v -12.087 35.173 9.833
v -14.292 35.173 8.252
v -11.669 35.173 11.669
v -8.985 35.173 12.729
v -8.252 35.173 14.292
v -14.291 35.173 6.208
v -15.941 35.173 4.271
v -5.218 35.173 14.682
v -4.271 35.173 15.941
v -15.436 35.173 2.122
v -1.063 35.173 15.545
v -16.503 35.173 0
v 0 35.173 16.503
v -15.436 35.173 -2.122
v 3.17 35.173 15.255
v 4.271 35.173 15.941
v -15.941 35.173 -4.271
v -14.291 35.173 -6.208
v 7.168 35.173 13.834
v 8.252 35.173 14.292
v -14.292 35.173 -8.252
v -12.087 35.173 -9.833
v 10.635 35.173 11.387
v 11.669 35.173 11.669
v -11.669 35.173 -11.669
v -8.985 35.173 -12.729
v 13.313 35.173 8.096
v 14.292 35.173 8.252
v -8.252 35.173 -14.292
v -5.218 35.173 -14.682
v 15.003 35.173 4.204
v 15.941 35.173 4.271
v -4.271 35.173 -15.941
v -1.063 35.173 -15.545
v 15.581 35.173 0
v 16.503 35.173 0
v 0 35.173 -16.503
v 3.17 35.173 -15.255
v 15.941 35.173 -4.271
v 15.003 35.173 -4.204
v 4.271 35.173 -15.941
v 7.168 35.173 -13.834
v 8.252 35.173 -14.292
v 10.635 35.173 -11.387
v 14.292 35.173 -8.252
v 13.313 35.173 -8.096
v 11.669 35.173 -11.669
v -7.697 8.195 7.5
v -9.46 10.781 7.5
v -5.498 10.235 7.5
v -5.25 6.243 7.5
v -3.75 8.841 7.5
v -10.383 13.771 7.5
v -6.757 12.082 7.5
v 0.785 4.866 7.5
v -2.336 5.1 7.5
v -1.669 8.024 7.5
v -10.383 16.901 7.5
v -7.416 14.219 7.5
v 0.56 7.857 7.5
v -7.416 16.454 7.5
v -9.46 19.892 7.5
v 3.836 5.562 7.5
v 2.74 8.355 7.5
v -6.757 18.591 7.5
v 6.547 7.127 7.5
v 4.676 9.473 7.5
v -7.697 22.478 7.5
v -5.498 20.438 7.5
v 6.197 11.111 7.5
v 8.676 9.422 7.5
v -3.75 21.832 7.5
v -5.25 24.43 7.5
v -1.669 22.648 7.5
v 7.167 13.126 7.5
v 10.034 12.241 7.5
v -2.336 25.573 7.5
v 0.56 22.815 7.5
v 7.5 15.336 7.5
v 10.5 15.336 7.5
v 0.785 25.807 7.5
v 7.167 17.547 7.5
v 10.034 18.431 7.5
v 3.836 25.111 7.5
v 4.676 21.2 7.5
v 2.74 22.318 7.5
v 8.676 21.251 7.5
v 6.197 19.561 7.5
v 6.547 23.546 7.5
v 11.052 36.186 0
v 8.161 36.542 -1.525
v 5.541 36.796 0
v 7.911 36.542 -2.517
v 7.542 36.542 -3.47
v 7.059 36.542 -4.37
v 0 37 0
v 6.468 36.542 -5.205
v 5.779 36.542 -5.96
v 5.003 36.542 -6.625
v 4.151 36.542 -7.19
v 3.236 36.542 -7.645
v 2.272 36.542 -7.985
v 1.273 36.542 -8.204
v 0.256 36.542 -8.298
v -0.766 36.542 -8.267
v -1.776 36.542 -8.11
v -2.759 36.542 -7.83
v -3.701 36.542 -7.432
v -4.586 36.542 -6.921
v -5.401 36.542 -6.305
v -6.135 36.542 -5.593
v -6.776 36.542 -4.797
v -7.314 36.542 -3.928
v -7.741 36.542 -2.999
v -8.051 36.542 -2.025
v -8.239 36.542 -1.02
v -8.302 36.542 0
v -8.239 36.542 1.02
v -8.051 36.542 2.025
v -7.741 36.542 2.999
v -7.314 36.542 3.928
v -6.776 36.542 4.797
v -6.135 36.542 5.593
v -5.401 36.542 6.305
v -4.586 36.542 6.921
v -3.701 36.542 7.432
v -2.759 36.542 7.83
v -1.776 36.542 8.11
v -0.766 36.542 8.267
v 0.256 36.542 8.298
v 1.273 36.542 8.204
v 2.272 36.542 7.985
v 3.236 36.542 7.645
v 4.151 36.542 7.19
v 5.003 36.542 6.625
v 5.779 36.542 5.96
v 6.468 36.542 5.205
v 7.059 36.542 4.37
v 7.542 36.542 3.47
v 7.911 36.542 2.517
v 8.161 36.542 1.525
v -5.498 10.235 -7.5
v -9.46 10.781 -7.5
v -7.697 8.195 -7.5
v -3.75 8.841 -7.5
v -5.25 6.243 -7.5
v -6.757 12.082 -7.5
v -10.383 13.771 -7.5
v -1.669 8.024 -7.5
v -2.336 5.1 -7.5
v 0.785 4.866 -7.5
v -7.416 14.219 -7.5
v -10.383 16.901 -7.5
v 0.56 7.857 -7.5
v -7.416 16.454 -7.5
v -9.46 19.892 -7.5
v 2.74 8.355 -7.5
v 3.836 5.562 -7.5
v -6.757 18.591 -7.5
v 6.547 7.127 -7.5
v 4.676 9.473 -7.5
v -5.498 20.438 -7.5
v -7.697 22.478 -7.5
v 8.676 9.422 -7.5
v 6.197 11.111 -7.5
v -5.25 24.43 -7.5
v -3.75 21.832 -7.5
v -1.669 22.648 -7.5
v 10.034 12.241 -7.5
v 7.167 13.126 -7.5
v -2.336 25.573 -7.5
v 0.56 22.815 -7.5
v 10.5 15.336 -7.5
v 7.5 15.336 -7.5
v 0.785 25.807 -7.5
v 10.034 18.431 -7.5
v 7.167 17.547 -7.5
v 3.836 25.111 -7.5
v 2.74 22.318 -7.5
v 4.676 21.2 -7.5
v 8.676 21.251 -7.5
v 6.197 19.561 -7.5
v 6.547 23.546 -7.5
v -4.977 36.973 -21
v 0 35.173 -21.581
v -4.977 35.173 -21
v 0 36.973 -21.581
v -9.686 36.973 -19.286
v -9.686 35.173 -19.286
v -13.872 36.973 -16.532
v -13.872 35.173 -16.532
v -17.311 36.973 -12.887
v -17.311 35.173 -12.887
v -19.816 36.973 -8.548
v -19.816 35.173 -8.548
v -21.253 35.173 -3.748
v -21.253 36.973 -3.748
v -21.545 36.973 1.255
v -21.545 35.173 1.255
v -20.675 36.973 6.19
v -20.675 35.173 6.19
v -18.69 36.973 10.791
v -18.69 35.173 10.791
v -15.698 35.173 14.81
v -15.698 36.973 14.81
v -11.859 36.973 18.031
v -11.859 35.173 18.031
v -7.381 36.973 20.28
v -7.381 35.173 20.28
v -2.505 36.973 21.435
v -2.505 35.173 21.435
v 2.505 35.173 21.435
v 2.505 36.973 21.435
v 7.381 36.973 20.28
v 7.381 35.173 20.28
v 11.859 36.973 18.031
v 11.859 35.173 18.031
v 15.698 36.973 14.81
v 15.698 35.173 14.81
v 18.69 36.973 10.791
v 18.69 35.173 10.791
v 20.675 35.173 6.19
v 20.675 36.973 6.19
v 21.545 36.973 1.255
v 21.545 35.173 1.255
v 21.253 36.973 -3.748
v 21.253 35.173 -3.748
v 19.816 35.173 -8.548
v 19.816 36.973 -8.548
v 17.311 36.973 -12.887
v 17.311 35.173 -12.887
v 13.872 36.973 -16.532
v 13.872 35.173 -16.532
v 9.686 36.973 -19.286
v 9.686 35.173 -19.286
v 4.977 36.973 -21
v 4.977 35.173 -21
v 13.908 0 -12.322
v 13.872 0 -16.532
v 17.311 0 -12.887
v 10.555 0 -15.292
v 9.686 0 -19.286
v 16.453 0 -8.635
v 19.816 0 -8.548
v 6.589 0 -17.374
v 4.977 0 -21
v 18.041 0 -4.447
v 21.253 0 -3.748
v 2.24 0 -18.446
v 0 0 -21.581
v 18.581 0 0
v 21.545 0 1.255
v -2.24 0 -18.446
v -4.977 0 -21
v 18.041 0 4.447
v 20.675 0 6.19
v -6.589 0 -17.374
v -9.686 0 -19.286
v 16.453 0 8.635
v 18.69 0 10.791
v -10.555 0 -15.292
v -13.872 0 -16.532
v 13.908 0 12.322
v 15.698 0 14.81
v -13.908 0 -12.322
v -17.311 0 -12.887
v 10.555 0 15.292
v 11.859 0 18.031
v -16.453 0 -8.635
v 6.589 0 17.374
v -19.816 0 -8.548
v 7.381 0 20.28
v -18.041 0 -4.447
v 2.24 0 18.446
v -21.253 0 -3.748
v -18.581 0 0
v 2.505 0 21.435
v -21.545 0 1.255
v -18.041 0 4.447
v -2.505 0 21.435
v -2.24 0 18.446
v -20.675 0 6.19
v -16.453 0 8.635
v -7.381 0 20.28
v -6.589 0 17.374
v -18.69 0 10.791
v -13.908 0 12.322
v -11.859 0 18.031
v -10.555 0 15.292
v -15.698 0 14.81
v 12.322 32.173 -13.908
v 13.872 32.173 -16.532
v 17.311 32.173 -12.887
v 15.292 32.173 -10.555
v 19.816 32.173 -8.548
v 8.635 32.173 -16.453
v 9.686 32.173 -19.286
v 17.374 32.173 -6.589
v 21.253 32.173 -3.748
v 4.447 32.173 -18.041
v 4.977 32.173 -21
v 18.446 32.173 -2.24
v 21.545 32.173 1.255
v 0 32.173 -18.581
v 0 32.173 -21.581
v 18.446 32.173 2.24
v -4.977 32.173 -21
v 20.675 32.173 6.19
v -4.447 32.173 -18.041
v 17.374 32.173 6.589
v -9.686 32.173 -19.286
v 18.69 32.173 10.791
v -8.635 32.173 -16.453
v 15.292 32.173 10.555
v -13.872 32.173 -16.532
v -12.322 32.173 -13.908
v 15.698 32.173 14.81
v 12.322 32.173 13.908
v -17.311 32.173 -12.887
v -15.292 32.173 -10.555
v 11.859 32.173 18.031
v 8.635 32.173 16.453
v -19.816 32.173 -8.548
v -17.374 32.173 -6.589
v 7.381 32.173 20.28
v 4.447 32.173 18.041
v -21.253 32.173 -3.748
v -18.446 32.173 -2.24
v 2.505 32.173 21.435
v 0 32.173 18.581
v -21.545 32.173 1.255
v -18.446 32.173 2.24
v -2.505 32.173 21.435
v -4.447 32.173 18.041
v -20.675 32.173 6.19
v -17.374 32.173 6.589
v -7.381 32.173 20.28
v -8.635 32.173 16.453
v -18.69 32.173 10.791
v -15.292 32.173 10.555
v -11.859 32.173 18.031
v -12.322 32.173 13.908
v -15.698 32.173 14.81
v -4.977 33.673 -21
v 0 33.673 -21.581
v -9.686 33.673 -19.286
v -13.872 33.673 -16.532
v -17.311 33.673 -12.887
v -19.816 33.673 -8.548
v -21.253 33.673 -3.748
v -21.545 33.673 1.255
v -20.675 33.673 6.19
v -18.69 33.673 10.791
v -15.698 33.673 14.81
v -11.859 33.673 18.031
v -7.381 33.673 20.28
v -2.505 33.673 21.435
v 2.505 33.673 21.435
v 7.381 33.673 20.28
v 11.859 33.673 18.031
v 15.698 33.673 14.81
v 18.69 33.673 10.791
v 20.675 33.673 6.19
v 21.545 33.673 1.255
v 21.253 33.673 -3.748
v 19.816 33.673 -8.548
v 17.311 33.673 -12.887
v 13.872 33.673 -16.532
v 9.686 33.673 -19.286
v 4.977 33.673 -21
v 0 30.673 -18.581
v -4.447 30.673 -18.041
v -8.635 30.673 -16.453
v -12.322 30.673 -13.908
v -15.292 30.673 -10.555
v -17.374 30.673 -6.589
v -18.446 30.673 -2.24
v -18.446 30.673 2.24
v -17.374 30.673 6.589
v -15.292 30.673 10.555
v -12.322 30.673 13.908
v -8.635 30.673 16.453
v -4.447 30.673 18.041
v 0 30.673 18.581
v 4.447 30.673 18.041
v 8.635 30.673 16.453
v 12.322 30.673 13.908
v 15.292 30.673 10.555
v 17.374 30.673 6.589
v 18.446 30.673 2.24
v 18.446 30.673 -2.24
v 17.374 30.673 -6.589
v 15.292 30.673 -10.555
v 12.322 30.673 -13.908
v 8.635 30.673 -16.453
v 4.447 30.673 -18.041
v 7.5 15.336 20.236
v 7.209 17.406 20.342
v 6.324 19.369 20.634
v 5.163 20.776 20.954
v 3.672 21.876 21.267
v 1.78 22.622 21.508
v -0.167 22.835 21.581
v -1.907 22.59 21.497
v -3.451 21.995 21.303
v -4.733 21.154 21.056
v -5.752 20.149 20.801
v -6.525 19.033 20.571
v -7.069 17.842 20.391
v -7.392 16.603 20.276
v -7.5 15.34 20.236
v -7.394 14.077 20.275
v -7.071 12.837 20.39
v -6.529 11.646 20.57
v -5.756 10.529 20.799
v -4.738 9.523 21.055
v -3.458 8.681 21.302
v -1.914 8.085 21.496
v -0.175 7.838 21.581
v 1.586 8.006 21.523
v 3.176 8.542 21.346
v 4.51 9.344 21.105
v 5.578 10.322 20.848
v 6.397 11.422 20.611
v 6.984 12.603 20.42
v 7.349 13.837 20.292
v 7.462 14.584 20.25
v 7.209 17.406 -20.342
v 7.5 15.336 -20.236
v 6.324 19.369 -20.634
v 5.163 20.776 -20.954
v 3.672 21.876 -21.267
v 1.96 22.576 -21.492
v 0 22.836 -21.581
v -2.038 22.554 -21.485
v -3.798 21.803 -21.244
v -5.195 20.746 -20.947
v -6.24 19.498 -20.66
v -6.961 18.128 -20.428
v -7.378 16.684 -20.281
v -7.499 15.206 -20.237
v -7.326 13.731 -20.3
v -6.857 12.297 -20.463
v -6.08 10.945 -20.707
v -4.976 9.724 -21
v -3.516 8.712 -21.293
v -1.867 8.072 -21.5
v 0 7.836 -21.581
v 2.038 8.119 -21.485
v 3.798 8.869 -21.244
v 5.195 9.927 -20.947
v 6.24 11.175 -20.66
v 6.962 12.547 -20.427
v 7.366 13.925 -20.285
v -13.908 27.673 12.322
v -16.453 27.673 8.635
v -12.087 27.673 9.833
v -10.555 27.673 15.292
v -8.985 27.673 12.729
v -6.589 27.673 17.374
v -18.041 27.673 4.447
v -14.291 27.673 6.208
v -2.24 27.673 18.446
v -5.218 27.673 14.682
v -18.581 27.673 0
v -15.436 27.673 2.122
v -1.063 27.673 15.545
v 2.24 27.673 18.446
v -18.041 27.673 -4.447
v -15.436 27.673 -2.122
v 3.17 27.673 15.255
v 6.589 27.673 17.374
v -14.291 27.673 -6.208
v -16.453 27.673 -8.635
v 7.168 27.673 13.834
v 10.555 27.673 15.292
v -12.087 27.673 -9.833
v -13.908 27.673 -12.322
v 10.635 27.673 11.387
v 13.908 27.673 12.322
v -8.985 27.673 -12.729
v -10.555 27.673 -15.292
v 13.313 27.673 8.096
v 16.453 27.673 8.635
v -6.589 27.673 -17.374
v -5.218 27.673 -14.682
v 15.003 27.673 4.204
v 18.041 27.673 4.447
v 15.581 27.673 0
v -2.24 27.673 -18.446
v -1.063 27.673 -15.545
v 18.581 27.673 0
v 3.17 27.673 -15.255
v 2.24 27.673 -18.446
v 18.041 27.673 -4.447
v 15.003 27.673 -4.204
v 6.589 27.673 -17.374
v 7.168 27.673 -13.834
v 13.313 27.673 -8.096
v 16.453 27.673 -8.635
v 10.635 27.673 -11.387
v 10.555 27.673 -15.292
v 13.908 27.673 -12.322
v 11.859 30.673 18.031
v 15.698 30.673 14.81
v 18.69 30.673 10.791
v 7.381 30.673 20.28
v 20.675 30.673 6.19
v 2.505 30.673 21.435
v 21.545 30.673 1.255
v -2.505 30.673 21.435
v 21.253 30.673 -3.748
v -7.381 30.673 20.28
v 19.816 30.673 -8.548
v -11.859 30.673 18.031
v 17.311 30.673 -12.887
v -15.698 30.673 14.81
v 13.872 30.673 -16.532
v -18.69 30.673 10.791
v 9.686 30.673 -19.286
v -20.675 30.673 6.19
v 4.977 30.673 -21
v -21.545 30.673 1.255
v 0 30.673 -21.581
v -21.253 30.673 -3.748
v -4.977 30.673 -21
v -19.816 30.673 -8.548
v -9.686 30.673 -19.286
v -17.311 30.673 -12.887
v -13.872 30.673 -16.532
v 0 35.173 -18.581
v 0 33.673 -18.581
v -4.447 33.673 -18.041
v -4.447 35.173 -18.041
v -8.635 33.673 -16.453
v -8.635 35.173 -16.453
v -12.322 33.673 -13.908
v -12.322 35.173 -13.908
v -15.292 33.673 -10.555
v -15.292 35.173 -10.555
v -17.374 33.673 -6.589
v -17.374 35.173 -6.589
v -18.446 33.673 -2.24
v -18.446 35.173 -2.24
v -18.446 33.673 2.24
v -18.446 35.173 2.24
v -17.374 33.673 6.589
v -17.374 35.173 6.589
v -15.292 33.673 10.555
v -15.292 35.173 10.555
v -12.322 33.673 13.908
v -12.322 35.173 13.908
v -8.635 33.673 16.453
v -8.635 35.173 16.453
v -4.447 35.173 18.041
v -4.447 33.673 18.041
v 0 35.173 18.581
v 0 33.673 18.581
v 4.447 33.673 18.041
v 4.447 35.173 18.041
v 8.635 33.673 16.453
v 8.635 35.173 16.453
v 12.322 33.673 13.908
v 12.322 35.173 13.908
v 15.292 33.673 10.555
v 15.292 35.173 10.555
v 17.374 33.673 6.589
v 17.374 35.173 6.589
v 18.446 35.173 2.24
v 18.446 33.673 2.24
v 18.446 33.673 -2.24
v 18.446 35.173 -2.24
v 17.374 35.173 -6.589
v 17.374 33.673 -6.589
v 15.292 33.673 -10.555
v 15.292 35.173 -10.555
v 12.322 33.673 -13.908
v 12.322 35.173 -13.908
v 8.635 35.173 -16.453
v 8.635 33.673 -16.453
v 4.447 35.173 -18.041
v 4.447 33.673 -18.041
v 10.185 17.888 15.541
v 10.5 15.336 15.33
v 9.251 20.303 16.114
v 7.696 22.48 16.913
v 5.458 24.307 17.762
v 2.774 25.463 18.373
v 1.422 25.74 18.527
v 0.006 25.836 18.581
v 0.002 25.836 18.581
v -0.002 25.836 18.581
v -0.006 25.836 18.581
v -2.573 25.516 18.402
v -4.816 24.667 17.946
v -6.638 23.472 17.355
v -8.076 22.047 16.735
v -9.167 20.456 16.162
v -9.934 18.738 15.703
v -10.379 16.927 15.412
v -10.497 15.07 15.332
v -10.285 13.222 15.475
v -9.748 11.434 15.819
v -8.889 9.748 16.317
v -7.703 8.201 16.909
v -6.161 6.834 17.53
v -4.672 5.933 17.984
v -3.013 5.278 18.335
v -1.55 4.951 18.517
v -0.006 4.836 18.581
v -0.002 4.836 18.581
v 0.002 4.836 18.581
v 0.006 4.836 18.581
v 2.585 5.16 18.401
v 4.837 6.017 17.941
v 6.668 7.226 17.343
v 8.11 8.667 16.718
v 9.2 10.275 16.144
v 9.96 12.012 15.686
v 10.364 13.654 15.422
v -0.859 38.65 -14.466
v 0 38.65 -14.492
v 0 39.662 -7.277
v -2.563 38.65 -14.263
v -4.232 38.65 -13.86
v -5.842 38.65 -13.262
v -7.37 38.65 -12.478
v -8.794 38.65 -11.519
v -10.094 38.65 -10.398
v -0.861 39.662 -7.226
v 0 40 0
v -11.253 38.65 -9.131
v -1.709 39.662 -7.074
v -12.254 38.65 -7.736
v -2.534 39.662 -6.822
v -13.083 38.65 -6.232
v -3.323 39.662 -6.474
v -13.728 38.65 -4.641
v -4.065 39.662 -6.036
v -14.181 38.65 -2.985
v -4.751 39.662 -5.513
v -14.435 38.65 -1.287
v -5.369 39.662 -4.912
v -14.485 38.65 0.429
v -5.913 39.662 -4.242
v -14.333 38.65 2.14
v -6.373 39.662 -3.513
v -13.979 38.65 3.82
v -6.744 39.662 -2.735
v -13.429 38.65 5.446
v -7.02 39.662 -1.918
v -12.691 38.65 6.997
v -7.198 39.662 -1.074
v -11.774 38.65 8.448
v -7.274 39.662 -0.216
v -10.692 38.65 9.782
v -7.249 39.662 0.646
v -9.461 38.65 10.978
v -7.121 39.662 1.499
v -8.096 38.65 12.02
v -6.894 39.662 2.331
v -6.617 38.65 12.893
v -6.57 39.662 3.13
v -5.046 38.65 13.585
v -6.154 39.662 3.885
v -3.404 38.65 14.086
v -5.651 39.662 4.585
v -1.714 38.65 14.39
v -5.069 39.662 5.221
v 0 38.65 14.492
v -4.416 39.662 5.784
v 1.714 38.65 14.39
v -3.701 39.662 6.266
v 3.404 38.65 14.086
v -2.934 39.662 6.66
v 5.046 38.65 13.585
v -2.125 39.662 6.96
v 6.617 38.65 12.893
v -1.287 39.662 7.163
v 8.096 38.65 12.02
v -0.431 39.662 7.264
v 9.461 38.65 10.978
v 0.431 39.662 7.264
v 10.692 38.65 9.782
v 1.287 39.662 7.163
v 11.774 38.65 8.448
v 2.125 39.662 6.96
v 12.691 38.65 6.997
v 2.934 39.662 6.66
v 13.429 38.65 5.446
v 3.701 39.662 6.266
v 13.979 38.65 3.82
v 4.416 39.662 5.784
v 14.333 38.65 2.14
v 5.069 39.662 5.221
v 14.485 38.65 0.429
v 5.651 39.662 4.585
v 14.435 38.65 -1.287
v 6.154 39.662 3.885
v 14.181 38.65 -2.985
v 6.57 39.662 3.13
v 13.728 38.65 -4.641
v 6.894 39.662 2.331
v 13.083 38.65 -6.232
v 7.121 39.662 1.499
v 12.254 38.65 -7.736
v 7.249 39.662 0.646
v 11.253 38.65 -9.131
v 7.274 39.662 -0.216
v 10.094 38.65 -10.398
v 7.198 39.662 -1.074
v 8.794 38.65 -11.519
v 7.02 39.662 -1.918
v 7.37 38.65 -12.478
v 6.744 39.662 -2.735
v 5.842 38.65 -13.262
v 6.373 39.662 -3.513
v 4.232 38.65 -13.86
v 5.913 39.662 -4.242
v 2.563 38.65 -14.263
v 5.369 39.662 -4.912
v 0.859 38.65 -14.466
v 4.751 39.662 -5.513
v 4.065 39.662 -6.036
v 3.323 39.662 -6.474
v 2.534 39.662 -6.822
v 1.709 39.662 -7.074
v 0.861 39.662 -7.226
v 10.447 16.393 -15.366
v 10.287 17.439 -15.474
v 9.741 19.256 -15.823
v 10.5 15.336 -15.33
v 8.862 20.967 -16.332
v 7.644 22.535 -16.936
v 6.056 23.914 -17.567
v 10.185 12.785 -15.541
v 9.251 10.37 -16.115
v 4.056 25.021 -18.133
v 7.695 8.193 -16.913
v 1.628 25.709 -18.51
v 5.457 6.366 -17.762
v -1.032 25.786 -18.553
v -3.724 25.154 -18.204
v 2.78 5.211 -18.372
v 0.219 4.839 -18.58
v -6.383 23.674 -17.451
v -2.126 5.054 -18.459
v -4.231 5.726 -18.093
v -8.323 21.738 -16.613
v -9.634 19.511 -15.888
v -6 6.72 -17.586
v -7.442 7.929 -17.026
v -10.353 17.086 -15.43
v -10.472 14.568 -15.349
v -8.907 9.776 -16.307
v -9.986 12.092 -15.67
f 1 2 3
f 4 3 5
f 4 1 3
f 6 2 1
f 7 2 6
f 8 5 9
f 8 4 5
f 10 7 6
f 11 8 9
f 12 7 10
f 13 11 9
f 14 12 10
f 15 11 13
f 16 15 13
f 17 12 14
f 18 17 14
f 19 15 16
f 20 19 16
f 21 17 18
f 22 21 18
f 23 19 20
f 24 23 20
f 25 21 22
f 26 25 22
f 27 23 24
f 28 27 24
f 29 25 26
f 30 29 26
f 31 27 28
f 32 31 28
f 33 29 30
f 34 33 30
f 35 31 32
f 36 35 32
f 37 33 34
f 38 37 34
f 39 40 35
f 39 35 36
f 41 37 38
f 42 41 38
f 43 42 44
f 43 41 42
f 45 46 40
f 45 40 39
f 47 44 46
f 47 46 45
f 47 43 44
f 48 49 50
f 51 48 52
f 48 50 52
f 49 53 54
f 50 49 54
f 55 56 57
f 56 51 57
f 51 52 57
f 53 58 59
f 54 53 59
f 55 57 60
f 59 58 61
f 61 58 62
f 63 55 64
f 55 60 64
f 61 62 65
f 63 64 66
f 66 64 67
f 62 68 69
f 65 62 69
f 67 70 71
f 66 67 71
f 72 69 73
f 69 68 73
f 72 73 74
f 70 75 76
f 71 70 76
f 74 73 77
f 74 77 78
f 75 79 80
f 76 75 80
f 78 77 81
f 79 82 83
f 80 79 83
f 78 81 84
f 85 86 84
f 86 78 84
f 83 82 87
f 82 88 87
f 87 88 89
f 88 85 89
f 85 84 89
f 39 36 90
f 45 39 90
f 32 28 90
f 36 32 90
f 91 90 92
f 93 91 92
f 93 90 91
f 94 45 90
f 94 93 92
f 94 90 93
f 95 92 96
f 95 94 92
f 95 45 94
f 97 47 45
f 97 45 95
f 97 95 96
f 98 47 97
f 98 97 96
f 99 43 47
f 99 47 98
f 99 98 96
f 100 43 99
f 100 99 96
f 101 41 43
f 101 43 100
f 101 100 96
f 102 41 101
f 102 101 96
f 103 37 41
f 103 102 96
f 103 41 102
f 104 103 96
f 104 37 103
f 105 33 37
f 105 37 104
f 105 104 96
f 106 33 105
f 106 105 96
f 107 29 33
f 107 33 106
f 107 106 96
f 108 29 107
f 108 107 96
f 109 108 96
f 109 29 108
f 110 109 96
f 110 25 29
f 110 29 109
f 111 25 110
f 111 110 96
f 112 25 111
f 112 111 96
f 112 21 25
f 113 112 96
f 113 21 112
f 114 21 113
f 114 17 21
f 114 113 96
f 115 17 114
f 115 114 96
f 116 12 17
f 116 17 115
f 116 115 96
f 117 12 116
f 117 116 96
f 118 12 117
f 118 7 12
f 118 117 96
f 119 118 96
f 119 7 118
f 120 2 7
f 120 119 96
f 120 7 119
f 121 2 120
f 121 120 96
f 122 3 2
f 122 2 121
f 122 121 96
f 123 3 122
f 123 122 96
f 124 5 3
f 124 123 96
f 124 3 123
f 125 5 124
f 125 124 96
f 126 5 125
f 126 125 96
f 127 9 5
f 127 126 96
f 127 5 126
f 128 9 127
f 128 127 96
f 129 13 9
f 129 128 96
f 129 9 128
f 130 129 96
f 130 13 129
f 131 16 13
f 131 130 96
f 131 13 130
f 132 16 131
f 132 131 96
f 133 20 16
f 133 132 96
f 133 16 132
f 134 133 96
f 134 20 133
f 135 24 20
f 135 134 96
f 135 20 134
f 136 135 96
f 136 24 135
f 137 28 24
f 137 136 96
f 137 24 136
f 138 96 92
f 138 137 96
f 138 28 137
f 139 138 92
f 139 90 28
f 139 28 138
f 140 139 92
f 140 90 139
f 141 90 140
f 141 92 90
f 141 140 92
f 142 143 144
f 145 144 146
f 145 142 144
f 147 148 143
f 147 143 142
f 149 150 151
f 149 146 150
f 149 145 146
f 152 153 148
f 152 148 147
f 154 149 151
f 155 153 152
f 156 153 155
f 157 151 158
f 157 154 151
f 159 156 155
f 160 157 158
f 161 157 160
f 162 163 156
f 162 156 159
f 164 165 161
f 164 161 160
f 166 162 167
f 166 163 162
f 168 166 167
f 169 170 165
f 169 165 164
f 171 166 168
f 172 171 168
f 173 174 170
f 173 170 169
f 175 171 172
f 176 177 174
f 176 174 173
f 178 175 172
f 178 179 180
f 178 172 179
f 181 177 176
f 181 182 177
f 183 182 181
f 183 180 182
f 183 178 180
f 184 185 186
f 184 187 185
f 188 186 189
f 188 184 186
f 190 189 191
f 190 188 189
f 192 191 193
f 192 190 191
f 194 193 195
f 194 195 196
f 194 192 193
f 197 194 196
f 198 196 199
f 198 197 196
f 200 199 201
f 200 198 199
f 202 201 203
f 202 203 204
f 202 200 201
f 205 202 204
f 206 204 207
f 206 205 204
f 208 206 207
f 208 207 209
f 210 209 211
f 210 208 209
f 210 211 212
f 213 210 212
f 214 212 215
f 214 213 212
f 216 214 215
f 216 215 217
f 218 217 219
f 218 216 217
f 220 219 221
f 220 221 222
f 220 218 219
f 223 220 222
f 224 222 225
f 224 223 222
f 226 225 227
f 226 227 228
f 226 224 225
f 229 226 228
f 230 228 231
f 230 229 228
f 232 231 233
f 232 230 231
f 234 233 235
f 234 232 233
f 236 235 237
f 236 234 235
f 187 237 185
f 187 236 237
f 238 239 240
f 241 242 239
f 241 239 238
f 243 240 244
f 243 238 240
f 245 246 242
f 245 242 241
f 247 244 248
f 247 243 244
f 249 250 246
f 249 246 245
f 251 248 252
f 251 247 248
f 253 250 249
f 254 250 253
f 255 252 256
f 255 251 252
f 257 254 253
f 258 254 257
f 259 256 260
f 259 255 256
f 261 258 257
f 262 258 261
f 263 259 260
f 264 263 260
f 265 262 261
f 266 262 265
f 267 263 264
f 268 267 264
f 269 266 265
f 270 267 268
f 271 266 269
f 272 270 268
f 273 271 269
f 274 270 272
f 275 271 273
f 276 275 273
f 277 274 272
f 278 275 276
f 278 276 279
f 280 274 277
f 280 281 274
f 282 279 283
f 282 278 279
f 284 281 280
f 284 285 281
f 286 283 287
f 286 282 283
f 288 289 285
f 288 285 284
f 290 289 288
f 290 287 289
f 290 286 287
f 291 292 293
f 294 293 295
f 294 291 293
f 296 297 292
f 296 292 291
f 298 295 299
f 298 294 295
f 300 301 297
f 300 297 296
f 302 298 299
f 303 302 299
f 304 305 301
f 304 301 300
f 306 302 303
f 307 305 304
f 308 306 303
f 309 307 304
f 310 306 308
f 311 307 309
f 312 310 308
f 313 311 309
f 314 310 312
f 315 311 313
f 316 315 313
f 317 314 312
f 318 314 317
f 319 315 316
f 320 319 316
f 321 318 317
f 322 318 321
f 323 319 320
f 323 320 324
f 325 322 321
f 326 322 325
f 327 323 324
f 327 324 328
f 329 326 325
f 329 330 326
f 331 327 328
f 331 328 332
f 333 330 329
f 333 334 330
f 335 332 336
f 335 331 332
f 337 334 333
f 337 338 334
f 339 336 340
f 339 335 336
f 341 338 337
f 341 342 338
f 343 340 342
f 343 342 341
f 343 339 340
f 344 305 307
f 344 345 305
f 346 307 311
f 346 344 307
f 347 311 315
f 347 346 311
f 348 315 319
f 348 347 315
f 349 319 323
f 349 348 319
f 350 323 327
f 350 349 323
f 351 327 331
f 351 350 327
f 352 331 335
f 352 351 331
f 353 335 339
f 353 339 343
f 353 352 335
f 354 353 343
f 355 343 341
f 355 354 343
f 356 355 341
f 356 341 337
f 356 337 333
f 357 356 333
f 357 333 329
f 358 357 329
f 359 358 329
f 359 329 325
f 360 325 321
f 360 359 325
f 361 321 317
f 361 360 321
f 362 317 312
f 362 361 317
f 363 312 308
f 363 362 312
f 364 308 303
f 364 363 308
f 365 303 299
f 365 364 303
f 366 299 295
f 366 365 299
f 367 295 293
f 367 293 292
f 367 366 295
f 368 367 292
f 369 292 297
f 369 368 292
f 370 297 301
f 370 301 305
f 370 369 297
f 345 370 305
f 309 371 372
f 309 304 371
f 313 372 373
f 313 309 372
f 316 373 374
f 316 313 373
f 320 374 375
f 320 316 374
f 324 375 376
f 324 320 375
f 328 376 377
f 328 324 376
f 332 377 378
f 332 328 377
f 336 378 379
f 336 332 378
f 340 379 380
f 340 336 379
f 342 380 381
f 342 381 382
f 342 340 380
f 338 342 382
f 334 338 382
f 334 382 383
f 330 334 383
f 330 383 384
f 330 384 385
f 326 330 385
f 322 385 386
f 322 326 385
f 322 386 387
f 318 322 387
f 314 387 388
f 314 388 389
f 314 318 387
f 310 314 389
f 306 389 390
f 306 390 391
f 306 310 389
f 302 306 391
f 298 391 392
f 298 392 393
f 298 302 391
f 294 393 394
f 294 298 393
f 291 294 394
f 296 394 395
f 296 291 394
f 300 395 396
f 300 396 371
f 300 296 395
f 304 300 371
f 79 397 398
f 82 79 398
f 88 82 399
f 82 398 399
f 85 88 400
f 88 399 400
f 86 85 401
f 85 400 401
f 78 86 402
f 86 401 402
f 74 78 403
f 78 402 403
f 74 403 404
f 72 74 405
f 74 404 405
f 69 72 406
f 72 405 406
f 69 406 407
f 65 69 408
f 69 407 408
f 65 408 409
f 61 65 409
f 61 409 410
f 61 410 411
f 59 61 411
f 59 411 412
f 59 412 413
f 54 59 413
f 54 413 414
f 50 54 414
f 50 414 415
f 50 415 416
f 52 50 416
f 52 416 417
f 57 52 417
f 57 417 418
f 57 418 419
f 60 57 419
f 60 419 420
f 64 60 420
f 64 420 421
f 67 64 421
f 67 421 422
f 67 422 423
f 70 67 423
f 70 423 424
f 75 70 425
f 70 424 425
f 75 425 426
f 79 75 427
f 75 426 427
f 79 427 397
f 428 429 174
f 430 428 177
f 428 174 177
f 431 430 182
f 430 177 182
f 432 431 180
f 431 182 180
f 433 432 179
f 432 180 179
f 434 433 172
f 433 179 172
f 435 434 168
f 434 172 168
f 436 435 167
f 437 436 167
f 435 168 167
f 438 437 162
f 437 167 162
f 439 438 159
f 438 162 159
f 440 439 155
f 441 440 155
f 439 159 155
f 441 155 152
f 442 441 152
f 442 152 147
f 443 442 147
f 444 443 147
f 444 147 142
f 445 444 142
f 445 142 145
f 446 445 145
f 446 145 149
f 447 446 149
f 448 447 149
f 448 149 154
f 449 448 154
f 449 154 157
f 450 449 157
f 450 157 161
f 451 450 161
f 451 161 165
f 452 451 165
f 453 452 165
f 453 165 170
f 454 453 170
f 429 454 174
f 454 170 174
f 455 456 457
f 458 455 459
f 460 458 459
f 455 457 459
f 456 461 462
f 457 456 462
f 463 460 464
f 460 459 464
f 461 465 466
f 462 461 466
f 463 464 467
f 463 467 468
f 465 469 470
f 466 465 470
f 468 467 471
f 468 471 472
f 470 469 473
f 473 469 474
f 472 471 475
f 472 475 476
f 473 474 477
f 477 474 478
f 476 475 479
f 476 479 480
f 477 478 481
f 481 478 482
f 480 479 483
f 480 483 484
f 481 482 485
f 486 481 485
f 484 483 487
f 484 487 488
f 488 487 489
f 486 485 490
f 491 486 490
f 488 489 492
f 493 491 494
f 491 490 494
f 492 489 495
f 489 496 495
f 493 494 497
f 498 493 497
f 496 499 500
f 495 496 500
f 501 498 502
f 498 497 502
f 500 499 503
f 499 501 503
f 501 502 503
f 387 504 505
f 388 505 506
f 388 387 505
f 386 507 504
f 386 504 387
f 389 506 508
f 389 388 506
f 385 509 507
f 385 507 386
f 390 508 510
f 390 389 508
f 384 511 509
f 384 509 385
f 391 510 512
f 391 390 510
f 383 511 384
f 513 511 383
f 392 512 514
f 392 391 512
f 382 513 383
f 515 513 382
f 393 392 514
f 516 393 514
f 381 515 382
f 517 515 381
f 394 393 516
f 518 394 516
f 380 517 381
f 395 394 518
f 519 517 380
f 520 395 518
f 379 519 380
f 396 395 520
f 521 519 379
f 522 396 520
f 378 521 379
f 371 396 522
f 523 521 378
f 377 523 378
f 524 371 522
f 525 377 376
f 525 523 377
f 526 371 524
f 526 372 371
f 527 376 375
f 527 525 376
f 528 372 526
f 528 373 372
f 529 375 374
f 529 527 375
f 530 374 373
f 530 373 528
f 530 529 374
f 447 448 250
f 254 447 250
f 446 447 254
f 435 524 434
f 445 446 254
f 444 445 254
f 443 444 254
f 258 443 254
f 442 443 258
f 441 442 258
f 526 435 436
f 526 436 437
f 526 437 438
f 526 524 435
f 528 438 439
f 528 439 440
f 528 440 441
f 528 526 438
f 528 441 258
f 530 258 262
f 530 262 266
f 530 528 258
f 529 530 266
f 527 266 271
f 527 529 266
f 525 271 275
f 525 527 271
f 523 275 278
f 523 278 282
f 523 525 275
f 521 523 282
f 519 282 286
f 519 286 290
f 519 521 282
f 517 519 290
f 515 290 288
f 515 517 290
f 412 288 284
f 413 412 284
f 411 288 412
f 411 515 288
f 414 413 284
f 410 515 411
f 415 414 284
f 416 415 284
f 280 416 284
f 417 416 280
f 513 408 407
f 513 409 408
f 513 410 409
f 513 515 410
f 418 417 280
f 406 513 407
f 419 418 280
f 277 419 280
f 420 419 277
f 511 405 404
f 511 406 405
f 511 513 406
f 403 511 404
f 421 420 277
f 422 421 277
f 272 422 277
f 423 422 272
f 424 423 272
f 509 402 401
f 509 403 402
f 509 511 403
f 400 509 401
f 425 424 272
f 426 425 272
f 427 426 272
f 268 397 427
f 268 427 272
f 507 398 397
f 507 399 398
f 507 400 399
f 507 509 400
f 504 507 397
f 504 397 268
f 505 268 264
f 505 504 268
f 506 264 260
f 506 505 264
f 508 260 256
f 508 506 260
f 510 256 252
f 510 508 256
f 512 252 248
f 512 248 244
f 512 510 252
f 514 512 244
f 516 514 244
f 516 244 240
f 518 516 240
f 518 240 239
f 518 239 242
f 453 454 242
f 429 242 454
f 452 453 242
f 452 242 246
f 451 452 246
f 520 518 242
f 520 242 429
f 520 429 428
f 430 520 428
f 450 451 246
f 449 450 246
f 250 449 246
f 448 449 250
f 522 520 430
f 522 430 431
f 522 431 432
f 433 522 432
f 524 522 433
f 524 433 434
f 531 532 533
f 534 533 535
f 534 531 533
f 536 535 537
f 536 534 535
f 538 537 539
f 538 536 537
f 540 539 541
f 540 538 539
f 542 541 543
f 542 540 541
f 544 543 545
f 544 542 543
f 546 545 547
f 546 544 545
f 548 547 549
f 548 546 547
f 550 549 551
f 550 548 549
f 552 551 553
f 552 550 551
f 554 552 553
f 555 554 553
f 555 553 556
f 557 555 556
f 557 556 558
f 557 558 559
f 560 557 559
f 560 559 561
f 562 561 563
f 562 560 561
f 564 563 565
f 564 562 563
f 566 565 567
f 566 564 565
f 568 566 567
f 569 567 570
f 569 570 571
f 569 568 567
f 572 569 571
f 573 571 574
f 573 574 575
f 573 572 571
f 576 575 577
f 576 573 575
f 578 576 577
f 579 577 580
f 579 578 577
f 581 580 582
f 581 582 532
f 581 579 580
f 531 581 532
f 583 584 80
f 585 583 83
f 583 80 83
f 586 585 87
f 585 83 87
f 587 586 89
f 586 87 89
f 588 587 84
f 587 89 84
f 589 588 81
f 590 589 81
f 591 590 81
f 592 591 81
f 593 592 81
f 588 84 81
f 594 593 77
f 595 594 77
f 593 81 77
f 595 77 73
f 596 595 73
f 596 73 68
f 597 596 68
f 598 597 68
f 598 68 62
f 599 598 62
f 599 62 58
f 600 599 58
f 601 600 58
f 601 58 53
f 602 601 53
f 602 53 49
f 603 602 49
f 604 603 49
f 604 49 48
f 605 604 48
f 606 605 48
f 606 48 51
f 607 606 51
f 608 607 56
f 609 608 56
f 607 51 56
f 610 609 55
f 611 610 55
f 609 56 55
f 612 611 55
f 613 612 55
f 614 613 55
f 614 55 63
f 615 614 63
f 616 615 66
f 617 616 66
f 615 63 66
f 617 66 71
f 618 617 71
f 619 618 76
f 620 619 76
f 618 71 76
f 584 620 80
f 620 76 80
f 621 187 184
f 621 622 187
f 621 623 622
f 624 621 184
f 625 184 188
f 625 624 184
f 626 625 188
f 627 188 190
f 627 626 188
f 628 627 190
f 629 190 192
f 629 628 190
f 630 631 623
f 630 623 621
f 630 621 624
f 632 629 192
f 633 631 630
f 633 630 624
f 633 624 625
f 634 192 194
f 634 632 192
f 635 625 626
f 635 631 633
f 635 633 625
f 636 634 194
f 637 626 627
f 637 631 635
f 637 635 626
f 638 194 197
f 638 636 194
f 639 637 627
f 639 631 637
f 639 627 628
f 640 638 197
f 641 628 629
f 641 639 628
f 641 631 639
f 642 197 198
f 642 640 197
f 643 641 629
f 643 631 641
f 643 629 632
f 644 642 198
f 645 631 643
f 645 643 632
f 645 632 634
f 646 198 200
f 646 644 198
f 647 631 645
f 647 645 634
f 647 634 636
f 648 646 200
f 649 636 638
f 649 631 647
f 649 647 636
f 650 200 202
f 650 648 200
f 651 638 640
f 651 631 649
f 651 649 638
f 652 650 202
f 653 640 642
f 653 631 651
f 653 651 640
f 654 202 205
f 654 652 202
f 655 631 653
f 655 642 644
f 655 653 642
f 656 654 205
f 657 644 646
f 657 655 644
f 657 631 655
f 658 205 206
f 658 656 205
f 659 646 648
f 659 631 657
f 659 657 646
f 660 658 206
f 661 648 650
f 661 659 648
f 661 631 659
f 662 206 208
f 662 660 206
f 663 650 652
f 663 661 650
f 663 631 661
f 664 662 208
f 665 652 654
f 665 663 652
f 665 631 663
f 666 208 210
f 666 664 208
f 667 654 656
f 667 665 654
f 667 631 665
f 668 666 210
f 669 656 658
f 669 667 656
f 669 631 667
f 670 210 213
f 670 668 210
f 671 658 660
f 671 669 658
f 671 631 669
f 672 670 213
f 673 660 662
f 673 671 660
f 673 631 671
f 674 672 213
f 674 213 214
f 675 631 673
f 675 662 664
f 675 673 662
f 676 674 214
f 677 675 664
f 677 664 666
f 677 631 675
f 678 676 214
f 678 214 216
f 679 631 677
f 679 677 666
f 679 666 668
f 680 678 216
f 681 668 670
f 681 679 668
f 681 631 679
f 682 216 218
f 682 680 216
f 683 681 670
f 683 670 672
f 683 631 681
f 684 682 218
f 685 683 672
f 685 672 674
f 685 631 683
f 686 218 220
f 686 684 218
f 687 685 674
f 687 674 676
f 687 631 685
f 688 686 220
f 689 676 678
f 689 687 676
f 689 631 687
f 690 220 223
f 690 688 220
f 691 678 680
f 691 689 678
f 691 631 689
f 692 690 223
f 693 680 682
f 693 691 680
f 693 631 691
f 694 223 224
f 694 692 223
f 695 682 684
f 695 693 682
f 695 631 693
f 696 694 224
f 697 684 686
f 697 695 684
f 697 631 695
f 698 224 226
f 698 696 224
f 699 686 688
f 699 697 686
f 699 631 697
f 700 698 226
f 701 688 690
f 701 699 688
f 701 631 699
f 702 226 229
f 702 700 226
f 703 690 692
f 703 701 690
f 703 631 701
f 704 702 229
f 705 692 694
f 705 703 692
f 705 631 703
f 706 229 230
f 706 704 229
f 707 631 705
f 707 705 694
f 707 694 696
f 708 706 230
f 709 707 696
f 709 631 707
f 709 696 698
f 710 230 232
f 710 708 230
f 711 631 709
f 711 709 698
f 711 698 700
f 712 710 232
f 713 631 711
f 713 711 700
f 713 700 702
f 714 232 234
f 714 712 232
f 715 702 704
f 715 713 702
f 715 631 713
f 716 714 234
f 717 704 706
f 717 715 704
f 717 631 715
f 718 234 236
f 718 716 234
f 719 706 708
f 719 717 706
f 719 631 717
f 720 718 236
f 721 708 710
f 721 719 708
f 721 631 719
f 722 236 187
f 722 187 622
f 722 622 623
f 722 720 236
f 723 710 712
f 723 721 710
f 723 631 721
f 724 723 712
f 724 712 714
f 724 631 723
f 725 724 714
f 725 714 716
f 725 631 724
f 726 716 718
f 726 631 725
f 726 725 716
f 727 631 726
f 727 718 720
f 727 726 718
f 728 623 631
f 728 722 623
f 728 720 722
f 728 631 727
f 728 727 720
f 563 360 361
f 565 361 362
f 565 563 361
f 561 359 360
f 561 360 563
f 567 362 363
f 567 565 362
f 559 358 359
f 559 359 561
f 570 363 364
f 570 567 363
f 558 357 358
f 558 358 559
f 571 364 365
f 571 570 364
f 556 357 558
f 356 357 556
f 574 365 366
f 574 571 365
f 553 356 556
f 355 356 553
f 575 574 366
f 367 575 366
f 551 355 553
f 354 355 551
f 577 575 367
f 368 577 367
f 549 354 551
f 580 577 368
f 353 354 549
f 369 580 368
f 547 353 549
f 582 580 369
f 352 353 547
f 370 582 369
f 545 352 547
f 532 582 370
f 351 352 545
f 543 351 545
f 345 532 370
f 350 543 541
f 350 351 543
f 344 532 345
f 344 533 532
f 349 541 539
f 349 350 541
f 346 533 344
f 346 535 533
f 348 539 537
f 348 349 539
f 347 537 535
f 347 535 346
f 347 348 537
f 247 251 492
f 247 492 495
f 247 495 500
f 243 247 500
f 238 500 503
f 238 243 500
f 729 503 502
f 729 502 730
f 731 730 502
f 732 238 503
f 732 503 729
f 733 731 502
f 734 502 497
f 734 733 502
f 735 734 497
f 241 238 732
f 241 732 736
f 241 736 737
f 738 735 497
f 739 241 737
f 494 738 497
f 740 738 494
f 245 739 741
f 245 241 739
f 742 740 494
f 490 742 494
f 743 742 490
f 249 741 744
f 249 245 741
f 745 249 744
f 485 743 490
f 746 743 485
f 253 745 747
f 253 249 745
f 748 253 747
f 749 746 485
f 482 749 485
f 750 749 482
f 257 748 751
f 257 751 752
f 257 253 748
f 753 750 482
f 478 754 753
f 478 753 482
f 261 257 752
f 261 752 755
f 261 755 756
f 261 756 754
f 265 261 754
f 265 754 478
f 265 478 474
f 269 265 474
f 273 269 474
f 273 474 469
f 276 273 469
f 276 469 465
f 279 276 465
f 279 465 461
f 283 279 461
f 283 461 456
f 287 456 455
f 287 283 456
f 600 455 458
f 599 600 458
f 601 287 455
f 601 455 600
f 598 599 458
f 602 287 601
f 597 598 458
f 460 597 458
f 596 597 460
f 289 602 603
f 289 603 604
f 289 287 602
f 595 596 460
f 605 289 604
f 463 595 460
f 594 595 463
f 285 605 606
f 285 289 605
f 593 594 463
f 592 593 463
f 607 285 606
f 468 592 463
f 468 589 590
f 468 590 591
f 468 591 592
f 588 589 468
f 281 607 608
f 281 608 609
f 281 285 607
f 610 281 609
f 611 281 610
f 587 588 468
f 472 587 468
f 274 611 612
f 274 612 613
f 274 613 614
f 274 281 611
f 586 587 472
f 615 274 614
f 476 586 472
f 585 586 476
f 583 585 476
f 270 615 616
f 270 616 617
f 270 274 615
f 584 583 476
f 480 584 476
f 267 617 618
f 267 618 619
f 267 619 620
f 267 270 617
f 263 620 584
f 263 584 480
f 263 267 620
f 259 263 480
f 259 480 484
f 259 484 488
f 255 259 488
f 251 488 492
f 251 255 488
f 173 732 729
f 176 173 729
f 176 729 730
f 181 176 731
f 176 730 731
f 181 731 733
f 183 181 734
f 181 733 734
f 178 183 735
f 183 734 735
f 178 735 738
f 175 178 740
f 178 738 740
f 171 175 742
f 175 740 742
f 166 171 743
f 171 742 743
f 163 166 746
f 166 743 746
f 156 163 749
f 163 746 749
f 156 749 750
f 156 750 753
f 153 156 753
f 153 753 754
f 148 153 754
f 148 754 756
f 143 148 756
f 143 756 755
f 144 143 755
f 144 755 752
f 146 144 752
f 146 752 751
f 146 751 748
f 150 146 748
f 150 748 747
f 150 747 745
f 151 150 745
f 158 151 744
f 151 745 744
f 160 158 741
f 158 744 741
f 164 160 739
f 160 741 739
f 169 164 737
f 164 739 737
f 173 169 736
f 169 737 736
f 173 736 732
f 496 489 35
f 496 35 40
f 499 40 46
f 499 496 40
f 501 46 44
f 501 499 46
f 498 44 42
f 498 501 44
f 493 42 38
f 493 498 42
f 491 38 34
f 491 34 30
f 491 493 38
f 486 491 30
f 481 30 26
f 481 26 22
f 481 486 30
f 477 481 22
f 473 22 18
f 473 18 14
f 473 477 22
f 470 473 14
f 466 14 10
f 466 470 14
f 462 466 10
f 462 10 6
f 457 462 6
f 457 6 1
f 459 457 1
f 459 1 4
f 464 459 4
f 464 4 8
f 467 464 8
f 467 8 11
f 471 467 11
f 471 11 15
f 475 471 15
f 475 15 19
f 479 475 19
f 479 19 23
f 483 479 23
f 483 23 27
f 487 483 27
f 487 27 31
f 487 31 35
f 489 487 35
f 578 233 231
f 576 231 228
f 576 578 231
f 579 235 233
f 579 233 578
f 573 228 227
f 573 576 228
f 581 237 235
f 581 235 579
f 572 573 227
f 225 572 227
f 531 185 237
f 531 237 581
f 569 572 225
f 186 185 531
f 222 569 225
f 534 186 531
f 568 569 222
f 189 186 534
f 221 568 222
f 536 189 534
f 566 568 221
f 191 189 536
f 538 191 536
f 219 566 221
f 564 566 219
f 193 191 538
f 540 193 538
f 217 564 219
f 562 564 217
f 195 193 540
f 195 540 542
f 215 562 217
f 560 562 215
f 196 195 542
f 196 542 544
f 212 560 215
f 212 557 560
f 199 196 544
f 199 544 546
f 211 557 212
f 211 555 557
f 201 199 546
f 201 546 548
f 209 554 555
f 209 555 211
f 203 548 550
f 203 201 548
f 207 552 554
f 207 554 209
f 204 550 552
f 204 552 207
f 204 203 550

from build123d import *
from OCP.BRepAlgoAPI import BRepAlgoAPI_Cut
from OCP.TopTools import TopTools_ListOfShape

# Parameters (mm, degrees)
SKETCH1_W            = 18.581245514
SKETCH1_H            = 1.5
SKETCH2_R            = 7.5
CUT_EXTRUDE1_DEPTH   = 24.5
SHELL1_OUTLINE_R     = 18.581245514
SHELL1_DEPTH         = 27.672789125
SHELL1_START         = 27.672789125
SHELL1_2_OUTLINE_R   = 15.581245514
SHELL1_2_DEPTH       = 9.327210875
SHELL1_START_2       = 35.172789125
SHELL1_3_OUTLINE_R   = 18.581245514
SHELL1_3_OUTLINE_R_2 = 15.581245514
SHELL1_3_DEPTH       = 1.827210875
SHELL1_START_3       = -18.581245614
SHELL1_4_OUTLINE_R   = 10.5
SHELL1_4_OUTLINE_R_2 = 7.5
SHELL1_4_DEPTH       = 37.162490158
SKETCH3_W            = 25
SKETCH3_H            = 25
CUT_EXTRUDE2_DEPTH   = 7.5


with BuildPart() as part:
    # Sketch1 → Revolve1 (revolve)
    with BuildSketch(Plane.XY, mode=Mode.PRIVATE) as revolve1_sk:
        with BuildLine():
            Line((0, 40), (0, 36.972789125))
            Line((0, 36.972789125), (21.581245514, 36.972789125))
            ThreePointArc((21.581245514, 36.972789125), (10.896262703, 39.239510786), (0, 40))
        make_face()
        Polygon((0, 36.972789125), (0, 35.172789125), (18.581245514, 35.172789125), (21.581245514, 35.172789125), (21.581245514, 36.972789125), align=None)
        with Locations((9.290622757, 34.422789125)):
            Rectangle(SKETCH1_W, SKETCH1_H)
        Polygon((0, 33.672789125), (0, 32.172789125), (18.581245514, 32.172789125), (21.581245514, 32.172789125), (21.581245514, 33.672789125), (18.581245514, 33.672789125), align=None)
        with Locations((9.290622757, 31.422789125)):
            Rectangle(SKETCH1_W, SKETCH1_H)
        Polygon((0, 30.672789125), (0, 0), (21.581245514, 0), (21.581245514, 30.672789125), (18.581245514, 30.672789125), align=None)
    revolve(revolve1_sk.sketch.rotate(Axis((0, 0, 0), (0, 1, 0)), 90), axis=Axis((0, 0, 0), (0, 1, 0)))

    # Sketch2 → Cut-Extrude1 (cut, symmetric)
    with BuildSketch(Plane.XY):
        with Locations((0, 15.336394563)):
            Circle(SKETCH2_R)
    extrude(amount=CUT_EXTRUDE1_DEPTH, both=True, mode=Mode.SUBTRACT)


with BuildPart() as shell1_tool:
    # Shell1: read off the stored shape, not the designer's step
    # Shell1 outline → Shell1 (new body)
    with BuildSketch(Plane(origin=(0, 0, 0), x_dir=(1, 0, 0), z_dir=(0, 1, 0))):
        Circle(SHELL1_OUTLINE_R)
    extrude(amount=SHELL1_DEPTH)


with BuildPart() as part_1:
    add(part.part)

    # Shell1: cut by shell1_tool, with a tolerance
    shell1_stock = TopTools_ListOfShape()
    shell1_stock.Append(part_1.part.wrapped)
    shell1_tools = TopTools_ListOfShape()
    shell1_tools.Append(shell1_tool.part.wrapped)
    shell1_cut = BRepAlgoAPI_Cut()
    shell1_cut.SetArguments(shell1_stock)
    shell1_cut.SetTools(shell1_tools)
    shell1_cut.SetFuzzyValue(0.00001)
    shell1_cut.Build()
    add(Compound.cast(shell1_cut.Shape()).solids(), mode=Mode.REPLACE)


with BuildPart() as shell1_2_tool:
    # Shell1 2 outline → Shell1 2 (new body)
    with BuildSketch(Plane(origin=(0, 0, 0), x_dir=(1, 0, 0), z_dir=(0, 1, 0)).offset(SHELL1_START)):
        Circle(SHELL1_2_OUTLINE_R)
    extrude(amount=SHELL1_2_DEPTH)


with BuildPart() as part_2:
    add(part_1.part)

    # Shell1 2: cut by shell1_2_tool, with a tolerance
    shell1_2_stock = TopTools_ListOfShape()
    shell1_2_stock.Append(part_2.part.wrapped)
    shell1_2_tools = TopTools_ListOfShape()
    shell1_2_tools.Append(shell1_2_tool.part.wrapped)
    shell1_2_cut = BRepAlgoAPI_Cut()
    shell1_2_cut.SetArguments(shell1_2_stock)
    shell1_2_cut.SetTools(shell1_2_tools)
    shell1_2_cut.SetFuzzyValue(0.00001)
    shell1_2_cut.Build()
    add(Compound.cast(shell1_2_cut.Shape()).solids(), mode=Mode.REPLACE)


with BuildPart() as shell1_3_tool:
    # Shell1 3 outline → Shell1 3 (new body)
    with BuildSketch(Plane(origin=(0, 0, 0), x_dir=(1, 0, 0), z_dir=(0, 1, 0)).offset(SHELL1_START_2)):
        Circle(SHELL1_3_OUTLINE_R)
        Circle(SHELL1_3_OUTLINE_R_2, mode=Mode.SUBTRACT)
    extrude(amount=SHELL1_3_DEPTH)


with BuildPart() as part_3:
    add(part_2.part)

    # Shell1 3: cut by shell1_3_tool, with a tolerance
    shell1_3_stock = TopTools_ListOfShape()
    shell1_3_stock.Append(part_3.part.wrapped)
    shell1_3_tools = TopTools_ListOfShape()
    shell1_3_tools.Append(shell1_3_tool.part.wrapped)
    shell1_3_cut = BRepAlgoAPI_Cut()
    shell1_3_cut.SetArguments(shell1_3_stock)
    shell1_3_cut.SetTools(shell1_3_tools)
    shell1_3_cut.SetFuzzyValue(0.00001)
    shell1_3_cut.Build()
    add(Compound.cast(shell1_3_cut.Shape()).solids(), mode=Mode.REPLACE)


with BuildPart() as shell1_4_tool:
    # Shell1 4 outline → Shell1 4 (new body)
    with BuildSketch(Plane.XY.offset(SHELL1_START_3)):
        with Locations((0, 15.336394563)):
            Circle(SHELL1_4_OUTLINE_R)
        with Locations((0, 15.336394563)):
            Circle(SHELL1_4_OUTLINE_R_2, mode=Mode.SUBTRACT)
    extrude(amount=SHELL1_4_DEPTH)


with BuildPart() as part_4:
    add(part_3.part)


with BuildPart() as part_5:
    # Shell1 4: joined with shell1_4_tool
    add(part_4.part.fuse(shell1_4_tool.part, tol=0.00001))


with BuildPart() as shell1_5_tool:
    # Shell1 5 outline → Shell1 5 (revolve)
    with BuildSketch(Plane.XY):
        with BuildLine():
            Line((18.581245514, 37), (0, 37))
            ThreePointArc((0, 37), (8.301999629, 36.541805844), (16.503153993, 35.172789109))
            Line((16.503153993, 35.172789109), (18.581245514, 35.172789109))
            Line((18.581245514, 35.172789109), (18.581245514, 37))
        make_face()
    revolve(axis=Axis((0, 0, 0), (0, 1, 0)))


with BuildPart() as part_6:
    add(part_5.part)


with BuildPart() as part_7:
    # Shell1 5: joined with shell1_5_tool
    add(part_6.part.fuse(shell1_5_tool.part, tol=0.00001))

    # Sketch3 → Cut-Extrude2 (cut, symmetric)
    with BuildSketch(Plane.XY):
        with Locations((0, 15.336394563)):
            Rectangle(SKETCH3_W, SKETCH3_H)
    extrude(amount=CUT_EXTRUDE2_DEPTH, both=True, mode=Mode.SUBTRACT)


solid = part_7.part
